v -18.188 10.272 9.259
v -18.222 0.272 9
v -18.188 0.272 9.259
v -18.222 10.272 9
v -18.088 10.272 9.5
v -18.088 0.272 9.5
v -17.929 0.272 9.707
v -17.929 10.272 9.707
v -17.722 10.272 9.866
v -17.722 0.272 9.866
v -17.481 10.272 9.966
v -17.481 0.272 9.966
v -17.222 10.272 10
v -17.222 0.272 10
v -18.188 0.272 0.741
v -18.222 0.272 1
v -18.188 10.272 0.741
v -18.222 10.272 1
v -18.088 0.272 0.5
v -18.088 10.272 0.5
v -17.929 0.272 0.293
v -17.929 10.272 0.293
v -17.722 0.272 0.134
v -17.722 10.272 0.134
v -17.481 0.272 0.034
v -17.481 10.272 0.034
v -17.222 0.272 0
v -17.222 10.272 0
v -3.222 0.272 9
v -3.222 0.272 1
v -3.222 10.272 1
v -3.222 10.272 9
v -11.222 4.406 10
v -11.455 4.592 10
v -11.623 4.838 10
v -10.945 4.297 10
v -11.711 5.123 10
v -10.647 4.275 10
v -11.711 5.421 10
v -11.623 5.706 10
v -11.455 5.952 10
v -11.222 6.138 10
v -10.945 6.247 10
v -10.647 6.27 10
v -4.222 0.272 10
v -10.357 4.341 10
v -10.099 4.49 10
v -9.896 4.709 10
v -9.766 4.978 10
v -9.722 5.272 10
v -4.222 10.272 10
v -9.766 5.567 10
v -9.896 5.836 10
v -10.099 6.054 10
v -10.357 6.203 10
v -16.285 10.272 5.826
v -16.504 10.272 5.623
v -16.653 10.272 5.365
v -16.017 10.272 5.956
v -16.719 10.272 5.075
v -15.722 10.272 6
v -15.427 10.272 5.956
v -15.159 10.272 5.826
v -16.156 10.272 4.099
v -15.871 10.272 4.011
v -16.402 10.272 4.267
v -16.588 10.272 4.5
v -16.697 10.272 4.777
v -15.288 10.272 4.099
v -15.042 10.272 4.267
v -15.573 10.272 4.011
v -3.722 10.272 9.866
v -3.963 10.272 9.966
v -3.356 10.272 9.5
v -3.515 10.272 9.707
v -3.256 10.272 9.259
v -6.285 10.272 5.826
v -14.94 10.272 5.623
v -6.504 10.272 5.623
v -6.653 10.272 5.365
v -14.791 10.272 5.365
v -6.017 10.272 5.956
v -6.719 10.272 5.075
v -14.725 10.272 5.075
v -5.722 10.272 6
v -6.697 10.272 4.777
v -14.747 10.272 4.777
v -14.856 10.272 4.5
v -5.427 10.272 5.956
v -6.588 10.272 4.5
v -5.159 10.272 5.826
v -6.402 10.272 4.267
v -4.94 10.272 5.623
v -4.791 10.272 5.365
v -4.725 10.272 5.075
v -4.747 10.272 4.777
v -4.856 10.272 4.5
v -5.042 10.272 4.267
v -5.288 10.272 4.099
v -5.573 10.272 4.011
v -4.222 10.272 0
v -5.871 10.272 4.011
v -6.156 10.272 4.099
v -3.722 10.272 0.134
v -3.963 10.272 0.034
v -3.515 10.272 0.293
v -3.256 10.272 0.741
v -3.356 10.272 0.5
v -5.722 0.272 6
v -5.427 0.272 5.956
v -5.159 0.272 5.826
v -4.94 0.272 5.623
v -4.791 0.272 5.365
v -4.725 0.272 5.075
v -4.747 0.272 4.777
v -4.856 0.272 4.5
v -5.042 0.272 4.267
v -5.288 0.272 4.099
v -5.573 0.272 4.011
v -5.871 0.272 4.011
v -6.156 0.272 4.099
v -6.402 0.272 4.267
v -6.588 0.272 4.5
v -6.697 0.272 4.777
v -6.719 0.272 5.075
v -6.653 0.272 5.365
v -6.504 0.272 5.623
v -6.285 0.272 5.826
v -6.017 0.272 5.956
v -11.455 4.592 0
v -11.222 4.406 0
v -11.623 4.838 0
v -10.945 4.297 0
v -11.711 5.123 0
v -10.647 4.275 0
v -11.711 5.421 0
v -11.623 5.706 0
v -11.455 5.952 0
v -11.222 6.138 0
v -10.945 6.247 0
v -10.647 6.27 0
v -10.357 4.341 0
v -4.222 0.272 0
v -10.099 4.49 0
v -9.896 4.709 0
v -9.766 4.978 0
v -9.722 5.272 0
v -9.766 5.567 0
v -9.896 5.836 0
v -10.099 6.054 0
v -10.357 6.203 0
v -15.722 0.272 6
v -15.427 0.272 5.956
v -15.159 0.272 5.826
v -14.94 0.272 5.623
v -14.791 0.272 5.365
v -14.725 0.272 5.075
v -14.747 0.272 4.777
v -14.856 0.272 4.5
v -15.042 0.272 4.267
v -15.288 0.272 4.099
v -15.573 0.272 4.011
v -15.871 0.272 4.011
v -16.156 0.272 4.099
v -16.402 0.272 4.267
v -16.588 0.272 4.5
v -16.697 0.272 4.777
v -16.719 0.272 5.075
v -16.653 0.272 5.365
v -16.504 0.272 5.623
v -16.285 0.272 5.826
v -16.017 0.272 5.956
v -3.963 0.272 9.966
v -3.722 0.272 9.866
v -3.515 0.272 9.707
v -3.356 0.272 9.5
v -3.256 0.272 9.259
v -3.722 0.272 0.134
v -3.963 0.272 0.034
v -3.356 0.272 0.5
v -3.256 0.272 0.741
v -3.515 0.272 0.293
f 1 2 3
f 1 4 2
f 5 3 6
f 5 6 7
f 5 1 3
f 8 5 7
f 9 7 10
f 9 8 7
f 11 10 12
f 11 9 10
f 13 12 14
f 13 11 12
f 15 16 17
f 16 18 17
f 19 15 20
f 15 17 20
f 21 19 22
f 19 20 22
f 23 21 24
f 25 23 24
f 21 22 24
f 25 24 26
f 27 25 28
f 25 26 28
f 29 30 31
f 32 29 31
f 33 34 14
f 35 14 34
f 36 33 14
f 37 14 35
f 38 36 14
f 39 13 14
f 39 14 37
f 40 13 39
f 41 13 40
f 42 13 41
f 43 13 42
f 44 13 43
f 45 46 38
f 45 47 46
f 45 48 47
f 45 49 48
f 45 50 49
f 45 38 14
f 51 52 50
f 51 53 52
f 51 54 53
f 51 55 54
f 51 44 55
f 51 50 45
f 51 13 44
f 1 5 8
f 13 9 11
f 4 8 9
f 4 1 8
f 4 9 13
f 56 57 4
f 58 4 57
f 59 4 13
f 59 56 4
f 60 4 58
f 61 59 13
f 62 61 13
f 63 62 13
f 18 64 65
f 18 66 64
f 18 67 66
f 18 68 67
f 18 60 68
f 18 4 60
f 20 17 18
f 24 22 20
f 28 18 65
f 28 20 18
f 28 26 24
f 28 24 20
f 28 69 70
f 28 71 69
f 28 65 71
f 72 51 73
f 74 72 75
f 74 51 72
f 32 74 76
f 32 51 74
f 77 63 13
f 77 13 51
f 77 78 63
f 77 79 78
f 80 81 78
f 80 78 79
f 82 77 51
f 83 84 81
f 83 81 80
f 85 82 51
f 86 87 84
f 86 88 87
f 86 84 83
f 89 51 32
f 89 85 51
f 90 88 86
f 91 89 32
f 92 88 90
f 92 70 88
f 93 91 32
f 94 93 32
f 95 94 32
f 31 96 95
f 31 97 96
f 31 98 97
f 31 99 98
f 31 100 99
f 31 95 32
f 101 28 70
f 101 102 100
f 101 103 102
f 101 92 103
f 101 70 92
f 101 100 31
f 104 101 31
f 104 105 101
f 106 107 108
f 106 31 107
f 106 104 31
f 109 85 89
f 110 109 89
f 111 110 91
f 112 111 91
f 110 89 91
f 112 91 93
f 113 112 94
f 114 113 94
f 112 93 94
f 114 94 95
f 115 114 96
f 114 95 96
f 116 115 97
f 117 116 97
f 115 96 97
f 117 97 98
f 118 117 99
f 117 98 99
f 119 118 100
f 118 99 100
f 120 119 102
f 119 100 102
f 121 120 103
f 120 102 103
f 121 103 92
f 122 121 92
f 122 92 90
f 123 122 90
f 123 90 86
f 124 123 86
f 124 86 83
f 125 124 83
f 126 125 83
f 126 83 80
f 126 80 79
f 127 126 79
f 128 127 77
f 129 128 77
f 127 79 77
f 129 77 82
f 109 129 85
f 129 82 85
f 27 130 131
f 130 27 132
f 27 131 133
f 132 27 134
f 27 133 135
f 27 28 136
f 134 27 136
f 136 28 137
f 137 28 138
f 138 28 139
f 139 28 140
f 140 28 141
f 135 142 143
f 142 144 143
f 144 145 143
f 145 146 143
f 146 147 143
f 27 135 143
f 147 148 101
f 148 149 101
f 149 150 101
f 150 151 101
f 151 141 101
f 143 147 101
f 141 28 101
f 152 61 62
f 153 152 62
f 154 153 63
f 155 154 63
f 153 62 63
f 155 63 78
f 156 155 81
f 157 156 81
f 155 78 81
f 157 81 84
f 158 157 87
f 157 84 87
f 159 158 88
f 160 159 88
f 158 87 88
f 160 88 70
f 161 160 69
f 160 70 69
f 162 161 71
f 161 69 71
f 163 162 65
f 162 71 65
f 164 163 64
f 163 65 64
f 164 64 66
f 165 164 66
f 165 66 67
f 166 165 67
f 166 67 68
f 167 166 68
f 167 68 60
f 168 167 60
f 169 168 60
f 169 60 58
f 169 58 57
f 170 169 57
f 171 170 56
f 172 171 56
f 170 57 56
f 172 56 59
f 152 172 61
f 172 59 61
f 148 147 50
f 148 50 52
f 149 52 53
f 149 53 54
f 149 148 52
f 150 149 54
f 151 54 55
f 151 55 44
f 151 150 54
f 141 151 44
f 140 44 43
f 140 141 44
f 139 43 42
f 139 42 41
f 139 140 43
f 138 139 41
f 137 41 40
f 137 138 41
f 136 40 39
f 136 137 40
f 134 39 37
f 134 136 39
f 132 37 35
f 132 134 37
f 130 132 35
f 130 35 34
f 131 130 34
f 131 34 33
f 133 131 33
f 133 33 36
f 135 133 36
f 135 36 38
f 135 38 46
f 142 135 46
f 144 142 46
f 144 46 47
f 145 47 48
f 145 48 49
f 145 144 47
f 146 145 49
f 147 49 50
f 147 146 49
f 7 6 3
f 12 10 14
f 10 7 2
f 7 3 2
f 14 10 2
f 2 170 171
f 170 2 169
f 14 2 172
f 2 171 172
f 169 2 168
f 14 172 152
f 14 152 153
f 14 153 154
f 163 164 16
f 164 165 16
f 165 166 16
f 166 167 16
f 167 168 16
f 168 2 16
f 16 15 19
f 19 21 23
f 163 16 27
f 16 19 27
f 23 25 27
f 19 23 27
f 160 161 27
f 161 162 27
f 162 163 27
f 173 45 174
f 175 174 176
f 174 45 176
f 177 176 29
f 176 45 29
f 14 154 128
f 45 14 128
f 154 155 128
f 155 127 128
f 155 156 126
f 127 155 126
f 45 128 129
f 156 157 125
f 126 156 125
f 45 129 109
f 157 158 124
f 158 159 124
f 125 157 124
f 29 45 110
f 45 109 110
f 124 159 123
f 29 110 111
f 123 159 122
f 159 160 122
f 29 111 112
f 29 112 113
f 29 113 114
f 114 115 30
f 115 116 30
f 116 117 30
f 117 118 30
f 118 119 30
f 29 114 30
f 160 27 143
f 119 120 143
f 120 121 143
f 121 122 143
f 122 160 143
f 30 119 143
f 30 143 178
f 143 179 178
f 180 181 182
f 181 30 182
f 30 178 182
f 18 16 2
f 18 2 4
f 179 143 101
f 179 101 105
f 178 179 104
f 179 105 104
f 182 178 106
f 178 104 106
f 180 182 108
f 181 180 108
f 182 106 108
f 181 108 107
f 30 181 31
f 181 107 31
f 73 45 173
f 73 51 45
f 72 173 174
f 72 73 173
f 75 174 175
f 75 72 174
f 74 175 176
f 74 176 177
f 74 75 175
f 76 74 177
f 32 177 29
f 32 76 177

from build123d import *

# Parameters (mm, degrees)
CROQUIS1_W              = 15
CROQUIS1_H              = 10
CROQUIS1_R              = 1
SALIENTE_EXTRUIR1_DEPTH = 10
CROQUIS2_R              = 1
CORTAR_EXTRUIR1_DEPTH   = 10
REDONDEO1_R             = 1


with BuildPart() as part:
    # Croquis1 → Saliente-Extruir1 (new body)
    with BuildSketch(Plane.XY):
        with Locations((-10.722064782, 5.272312164)):
            Rectangle(CROQUIS1_W, CROQUIS1_H)
        with Locations((-10.722064782, 5.272312164)):
            Circle(CROQUIS1_R, mode=Mode.SUBTRACT)
    extrude(amount=SALIENTE_EXTRUIR1_DEPTH)

    # Croquis2 → Cortar-Extruir1 (cut)
    with BuildSketch(Plane(origin=(0, 10.272312164, 0), x_dir=(-1, 0, 0), z_dir=(0, 1, 0))):
        with Locations(Location((15.722064782, 5, 0), (0, 0, 90))):
            Circle(CROQUIS2_R)
        with Locations(Location((5.722064782, 5, 0), (0, 0, 90))):
            Circle(CROQUIS2_R)
    extrude(amount=-CORTAR_EXTRUIR1_DEPTH, mode=Mode.SUBTRACT)

    # Redondeo1
    redondeo1_edges = [part.edges().sort_by_distance(p)[0] for p in [
        (-3.222064782, 5.272312164, 10),
        (-18.222064782, 5.272312164, 10),
        (-3.222064782, 5.272312164, 0),
        (-18.222064782, 5.272312164, 0),
    ]]
    fillet(redondeo1_edges, radius=REDONDEO1_R)


solid = part.part
